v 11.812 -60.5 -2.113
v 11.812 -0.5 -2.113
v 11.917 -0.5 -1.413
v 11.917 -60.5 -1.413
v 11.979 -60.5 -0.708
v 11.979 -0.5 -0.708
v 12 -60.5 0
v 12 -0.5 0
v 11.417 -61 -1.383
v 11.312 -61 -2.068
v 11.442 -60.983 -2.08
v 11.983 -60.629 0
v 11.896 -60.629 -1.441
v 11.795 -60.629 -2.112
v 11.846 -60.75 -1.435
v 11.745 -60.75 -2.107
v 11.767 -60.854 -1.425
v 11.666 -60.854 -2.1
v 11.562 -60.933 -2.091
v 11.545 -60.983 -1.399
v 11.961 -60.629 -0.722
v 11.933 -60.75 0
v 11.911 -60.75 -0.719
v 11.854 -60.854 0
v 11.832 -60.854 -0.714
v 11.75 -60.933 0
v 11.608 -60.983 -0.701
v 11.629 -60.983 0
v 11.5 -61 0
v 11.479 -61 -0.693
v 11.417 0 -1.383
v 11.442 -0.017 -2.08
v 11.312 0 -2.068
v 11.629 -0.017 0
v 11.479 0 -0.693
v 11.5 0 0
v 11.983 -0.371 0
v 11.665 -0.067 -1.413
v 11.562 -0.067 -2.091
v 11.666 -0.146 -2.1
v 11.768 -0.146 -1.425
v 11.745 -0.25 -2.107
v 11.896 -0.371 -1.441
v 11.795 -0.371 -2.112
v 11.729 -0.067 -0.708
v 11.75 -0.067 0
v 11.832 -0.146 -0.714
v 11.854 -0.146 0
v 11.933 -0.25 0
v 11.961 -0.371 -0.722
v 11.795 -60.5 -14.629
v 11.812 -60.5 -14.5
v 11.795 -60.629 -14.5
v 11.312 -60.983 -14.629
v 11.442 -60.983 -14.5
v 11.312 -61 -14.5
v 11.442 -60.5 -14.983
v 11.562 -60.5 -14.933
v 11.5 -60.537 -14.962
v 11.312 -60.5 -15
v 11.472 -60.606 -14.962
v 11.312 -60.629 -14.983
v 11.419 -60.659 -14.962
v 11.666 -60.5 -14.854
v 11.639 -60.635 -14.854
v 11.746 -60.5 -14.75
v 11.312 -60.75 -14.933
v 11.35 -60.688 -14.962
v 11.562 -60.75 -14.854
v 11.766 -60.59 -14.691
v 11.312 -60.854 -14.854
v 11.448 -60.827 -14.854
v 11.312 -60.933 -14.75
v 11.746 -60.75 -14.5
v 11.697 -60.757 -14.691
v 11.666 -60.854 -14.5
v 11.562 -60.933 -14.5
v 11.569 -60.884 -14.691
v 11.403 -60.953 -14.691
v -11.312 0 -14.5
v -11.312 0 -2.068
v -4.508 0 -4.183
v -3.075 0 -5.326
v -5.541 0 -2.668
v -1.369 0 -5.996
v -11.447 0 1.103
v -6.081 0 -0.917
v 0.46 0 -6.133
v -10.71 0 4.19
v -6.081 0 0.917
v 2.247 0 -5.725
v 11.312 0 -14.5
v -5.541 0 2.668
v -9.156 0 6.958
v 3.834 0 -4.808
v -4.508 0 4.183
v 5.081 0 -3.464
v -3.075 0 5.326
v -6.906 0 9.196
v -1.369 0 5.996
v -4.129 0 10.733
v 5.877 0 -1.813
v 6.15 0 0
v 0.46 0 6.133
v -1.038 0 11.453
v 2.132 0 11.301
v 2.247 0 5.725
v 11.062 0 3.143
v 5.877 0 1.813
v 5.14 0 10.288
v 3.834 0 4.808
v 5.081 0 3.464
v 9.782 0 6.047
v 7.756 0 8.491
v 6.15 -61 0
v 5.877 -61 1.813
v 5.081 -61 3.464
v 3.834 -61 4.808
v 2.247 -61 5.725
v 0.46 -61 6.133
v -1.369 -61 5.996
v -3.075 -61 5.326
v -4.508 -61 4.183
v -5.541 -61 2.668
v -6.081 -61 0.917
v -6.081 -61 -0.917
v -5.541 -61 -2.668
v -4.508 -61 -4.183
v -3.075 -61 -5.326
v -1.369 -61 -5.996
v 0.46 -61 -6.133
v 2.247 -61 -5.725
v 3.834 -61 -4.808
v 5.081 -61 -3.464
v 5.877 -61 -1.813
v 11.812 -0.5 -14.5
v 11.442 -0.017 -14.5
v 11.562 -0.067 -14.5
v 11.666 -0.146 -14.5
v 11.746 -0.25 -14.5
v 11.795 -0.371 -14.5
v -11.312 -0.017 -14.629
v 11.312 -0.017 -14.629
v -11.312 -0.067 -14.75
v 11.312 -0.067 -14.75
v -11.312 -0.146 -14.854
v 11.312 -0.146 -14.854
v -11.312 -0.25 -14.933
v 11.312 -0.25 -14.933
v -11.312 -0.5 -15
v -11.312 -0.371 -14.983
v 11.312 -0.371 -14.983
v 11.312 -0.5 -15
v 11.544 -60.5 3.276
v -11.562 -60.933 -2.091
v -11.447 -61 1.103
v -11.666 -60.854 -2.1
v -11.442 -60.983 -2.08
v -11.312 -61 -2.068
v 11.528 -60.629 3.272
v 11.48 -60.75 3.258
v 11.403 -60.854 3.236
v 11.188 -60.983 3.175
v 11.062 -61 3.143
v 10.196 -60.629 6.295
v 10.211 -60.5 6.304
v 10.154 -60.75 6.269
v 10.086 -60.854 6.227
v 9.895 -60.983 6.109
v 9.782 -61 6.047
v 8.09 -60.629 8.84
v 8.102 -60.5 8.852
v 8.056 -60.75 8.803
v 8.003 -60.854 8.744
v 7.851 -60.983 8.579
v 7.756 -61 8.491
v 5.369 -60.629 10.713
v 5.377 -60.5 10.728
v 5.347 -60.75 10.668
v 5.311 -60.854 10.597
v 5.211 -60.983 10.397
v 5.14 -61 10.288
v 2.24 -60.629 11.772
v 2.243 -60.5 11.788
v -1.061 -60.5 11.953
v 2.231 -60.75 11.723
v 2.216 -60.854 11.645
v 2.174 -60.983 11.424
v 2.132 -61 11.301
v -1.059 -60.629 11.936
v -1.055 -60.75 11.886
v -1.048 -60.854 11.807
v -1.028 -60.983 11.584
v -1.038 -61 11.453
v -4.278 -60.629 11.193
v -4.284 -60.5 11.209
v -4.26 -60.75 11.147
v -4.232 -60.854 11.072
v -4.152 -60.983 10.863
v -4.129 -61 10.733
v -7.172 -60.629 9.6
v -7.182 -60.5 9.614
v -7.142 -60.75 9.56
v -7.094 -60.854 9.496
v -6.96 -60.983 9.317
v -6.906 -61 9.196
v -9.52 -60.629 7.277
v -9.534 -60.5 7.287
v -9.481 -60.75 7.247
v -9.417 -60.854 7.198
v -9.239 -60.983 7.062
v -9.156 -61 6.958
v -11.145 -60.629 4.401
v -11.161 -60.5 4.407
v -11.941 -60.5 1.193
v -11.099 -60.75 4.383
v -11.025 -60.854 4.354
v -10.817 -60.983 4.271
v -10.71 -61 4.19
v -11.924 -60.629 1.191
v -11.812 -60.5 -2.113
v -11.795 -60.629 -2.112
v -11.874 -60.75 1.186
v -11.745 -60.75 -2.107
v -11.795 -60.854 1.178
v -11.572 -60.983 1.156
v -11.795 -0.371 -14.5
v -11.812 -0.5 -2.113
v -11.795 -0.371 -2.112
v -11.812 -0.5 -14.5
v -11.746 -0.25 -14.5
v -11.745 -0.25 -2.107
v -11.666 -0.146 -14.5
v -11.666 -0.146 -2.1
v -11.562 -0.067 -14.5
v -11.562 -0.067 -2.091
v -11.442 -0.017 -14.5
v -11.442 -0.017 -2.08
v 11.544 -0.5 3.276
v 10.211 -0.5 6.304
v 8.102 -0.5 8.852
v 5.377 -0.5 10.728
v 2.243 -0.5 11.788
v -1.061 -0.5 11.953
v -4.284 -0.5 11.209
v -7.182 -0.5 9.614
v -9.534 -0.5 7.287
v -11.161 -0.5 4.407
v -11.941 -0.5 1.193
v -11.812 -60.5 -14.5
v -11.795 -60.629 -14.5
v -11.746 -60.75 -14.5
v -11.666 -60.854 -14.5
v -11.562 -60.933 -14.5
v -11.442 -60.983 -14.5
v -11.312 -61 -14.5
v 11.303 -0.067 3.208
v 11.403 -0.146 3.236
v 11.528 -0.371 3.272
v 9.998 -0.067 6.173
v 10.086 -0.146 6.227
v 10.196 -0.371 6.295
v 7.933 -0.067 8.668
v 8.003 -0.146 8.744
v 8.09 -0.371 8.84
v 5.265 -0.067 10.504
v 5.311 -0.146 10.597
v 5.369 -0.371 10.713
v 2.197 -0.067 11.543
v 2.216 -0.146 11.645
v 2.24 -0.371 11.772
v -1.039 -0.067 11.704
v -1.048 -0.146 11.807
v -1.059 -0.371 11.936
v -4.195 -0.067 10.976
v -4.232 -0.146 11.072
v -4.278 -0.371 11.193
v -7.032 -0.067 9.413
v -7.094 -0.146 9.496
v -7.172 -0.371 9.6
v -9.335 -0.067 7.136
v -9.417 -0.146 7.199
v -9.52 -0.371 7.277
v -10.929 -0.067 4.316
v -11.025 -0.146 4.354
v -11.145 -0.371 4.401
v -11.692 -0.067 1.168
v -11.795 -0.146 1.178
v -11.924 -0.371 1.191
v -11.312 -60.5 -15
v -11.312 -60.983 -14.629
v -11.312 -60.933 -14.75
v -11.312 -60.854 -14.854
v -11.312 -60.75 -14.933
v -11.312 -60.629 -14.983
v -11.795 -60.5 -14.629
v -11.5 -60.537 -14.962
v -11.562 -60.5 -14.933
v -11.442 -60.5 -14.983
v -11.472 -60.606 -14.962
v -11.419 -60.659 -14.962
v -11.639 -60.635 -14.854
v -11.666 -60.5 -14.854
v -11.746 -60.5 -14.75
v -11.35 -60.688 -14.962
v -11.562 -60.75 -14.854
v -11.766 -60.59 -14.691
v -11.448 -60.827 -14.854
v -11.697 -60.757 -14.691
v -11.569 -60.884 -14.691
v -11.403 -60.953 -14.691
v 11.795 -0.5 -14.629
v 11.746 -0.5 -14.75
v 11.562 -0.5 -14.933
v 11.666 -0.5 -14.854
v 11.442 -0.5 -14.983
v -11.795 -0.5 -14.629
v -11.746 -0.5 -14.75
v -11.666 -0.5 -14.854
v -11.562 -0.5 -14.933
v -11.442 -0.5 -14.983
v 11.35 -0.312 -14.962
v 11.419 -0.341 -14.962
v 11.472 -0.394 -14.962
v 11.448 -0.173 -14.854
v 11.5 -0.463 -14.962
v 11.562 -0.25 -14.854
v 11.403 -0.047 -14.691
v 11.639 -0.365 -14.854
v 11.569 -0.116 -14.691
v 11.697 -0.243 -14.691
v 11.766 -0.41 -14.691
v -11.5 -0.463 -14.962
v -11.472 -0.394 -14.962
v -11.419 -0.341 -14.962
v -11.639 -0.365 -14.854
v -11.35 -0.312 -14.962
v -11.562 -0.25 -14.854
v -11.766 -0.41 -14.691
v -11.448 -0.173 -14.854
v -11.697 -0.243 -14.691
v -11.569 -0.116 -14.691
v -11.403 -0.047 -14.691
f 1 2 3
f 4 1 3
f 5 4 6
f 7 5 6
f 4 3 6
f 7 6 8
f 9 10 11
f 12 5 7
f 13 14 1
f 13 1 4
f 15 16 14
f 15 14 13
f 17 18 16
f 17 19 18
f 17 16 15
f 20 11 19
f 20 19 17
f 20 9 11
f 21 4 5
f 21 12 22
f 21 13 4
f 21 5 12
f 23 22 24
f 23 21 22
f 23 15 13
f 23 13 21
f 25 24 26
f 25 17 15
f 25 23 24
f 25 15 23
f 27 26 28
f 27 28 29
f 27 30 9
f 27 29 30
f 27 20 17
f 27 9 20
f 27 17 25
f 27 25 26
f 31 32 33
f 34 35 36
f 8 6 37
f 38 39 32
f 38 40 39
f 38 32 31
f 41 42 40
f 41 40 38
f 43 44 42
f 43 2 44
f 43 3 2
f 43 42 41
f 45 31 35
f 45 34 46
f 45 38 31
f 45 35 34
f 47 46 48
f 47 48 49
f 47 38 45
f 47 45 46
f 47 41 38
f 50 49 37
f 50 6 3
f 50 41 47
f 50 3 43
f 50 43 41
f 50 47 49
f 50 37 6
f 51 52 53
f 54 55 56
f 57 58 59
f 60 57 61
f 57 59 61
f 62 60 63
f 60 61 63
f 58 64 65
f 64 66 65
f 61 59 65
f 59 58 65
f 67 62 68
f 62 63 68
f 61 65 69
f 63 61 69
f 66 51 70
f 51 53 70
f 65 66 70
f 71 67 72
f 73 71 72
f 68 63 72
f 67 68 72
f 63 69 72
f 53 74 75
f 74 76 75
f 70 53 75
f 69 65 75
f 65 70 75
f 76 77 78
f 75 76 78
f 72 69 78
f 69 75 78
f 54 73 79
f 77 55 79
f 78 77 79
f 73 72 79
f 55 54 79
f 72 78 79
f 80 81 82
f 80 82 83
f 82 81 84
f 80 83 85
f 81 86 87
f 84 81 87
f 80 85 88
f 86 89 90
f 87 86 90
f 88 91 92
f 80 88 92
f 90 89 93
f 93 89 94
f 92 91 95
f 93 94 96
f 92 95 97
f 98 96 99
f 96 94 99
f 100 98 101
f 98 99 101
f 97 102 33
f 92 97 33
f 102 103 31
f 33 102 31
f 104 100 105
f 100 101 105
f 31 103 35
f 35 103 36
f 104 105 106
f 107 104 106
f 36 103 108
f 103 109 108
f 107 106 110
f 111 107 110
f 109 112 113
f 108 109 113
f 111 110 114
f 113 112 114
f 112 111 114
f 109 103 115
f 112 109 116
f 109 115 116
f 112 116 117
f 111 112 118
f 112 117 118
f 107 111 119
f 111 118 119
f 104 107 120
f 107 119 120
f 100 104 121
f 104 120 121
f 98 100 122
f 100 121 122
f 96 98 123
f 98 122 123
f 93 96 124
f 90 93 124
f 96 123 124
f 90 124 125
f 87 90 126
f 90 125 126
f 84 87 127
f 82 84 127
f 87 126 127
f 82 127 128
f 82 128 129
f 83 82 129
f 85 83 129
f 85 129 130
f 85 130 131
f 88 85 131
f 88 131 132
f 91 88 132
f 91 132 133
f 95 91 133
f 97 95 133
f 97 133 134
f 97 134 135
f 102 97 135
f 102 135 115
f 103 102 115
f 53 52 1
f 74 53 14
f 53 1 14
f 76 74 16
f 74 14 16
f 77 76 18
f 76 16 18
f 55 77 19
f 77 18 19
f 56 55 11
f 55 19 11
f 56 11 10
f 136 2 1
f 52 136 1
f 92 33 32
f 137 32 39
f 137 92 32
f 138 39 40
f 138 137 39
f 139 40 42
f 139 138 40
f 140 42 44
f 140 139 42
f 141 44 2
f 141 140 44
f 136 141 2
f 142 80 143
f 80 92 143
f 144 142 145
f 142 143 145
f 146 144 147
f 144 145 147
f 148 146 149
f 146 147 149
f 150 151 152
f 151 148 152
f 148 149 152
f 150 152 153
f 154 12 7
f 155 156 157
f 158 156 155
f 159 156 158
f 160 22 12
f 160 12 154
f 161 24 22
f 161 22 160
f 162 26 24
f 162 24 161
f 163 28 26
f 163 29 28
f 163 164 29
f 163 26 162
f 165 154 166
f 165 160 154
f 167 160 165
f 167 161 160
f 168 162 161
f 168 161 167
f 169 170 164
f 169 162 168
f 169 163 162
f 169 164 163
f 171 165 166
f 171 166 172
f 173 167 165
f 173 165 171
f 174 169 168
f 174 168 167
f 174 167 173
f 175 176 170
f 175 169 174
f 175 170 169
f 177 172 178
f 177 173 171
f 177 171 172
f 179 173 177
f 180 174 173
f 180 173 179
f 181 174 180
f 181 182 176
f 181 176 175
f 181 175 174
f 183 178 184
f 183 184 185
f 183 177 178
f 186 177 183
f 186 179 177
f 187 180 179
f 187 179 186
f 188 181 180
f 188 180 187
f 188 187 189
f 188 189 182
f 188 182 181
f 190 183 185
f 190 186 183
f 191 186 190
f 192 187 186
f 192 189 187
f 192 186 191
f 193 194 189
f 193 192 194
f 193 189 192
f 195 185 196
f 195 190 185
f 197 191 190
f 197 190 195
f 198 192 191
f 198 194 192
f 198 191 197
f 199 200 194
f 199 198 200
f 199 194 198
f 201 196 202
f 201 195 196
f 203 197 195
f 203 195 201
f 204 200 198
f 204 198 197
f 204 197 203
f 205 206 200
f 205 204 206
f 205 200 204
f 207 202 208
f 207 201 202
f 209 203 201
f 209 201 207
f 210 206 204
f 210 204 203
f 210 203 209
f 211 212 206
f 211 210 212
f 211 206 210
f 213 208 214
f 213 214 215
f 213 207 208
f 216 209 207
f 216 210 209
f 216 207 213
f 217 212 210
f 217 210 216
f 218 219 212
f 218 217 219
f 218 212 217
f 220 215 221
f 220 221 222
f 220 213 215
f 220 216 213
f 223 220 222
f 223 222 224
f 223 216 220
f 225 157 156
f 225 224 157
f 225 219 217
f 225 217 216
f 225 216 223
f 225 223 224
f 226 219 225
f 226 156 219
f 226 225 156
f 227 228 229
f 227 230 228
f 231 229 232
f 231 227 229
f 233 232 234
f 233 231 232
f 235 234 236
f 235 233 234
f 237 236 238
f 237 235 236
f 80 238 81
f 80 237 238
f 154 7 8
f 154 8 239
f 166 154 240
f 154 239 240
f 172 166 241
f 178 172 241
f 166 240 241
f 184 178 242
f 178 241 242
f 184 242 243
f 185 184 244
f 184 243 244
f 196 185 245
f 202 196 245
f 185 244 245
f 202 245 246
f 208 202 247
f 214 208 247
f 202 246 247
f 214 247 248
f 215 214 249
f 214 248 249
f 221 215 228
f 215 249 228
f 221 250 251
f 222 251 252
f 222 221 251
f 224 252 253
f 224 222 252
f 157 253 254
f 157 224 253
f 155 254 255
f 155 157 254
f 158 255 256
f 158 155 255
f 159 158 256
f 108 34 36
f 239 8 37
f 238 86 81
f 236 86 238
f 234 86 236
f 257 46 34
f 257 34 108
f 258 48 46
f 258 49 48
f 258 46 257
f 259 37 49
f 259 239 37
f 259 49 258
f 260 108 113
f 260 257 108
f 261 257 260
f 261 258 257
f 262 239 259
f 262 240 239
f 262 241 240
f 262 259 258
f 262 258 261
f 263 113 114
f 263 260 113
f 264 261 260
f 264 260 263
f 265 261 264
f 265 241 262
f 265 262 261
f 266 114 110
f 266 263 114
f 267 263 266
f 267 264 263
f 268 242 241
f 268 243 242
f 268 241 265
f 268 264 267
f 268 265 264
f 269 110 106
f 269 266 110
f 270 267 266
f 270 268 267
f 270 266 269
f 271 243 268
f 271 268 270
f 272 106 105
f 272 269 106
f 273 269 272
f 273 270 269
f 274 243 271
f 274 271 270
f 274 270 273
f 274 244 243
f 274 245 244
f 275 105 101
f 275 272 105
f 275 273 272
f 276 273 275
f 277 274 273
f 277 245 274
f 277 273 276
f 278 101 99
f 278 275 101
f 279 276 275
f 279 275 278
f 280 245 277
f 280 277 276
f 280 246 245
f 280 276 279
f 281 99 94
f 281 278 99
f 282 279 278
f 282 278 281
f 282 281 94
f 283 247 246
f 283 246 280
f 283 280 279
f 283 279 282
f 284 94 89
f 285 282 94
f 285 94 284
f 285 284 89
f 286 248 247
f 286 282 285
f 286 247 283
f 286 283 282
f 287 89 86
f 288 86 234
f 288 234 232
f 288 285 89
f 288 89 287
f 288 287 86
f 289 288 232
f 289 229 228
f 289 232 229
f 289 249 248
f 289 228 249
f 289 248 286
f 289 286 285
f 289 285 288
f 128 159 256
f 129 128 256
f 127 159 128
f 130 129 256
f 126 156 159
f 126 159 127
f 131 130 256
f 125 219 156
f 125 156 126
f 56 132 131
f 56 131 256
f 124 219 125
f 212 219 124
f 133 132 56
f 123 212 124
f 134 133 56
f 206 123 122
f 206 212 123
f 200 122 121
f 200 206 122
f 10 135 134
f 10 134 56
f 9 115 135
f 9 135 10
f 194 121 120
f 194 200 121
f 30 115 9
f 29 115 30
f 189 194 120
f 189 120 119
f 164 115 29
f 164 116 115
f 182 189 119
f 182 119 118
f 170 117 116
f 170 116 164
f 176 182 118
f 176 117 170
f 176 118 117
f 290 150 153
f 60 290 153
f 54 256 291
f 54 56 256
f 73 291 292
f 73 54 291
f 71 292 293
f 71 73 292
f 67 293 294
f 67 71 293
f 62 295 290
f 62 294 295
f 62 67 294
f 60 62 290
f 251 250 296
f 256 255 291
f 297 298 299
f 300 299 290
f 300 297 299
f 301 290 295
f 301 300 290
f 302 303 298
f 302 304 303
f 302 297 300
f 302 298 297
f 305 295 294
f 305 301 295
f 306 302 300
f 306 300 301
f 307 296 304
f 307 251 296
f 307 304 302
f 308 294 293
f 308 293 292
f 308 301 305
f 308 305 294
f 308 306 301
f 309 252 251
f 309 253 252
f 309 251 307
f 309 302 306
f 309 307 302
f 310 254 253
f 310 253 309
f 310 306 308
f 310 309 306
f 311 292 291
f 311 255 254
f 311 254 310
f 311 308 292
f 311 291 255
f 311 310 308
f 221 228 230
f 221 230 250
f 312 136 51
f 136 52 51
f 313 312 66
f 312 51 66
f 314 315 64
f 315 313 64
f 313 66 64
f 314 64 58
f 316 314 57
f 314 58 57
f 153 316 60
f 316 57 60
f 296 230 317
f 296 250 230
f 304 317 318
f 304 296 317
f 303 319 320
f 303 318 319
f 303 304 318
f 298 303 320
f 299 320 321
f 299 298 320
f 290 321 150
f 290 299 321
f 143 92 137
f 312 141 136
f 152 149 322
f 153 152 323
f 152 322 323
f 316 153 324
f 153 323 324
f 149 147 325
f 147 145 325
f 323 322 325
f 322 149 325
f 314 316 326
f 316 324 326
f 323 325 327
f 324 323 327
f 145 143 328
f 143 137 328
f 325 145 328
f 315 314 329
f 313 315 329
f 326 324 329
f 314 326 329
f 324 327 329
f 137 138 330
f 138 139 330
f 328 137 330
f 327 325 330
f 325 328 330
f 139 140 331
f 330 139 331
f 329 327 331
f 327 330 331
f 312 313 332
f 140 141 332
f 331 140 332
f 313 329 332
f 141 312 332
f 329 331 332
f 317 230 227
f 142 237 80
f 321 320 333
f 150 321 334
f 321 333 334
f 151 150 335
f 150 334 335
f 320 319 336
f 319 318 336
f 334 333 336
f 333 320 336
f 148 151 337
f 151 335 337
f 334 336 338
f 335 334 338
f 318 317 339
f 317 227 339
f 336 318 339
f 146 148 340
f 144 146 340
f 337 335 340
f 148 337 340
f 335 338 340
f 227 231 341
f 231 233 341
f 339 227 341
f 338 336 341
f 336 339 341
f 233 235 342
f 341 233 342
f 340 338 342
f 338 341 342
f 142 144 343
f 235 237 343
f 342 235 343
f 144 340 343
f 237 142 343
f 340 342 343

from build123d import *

# Parameters (mm, degrees)
F1_R     = 6.15
F2_DEPTH = 61
F3_DEPTH = 61.001
F4_DEPTH = 2
F5_R     = 0.5


# Not quite as in the source:
# - two fillets or chamfers of one size are made in one step


with BuildPart() as f2:
    # F1 (on face) → F2 (new body)
    with BuildSketch(Plane.XZ):
        Circle(F1_R)
    extrude(amount=F2_DEPTH)


with BuildPart() as f2b:
    # F0 (on Front) → F2, piece 2 (new body)
    with BuildSketch(Plane.XZ):
        with BuildLine():
            ThreePointArc((11.8124997243, -2.1130192291), (11.9530330187, -1.0606609515), (12, 0))
            ThreePointArc((12, 0), (-1.0606609515, 11.9530330187), (-11.8124997243, -2.1130192291))
            Line((-11.8124997243, -2.1130192291), (-11.8124997243, 1))
            Line((-11.8124997243, 1), (11.8124997243, 1))
            Line((11.8124997243, 1), (11.8124997243, -2.1130192291))
        make_face()
        with BuildLine():
            Line((-11.8124997243, 1), (-11.8124997243, -2.1130192291))
            ThreePointArc((-11.8124997243, -2.1130192291), (0, -12), (11.8124997243, -2.1130192291))
            Line((11.8124997243, -2.1130192291), (11.8124997243, 1))
            Line((11.8124997243, 1), (-11.8124997243, 1))
        make_face()
        with BuildLine():
            ThreePointArc((11.8124997243, -2.1130192291), (0, -12), (-11.8124997243, -2.1130192291))
            Line((-11.8124997243, -2.1130192291), (-11.8124997243, -13))
            Line((-11.8124997243, -13), (11.8124997243, -13))
            Line((11.8124997243, -13), (11.8124997243, -2.1130192291))
        make_face()
    extrude(amount=F2_DEPTH)


with BuildPart() as f3_tool:
    # F3 (cut, through all): a face of the model
    f3_faces = [f2.part.faces().sort_by_distance(p)[0] for p in [
        (0, -61, 0),
    ]]
    extrude(f3_faces, amount=-F3_DEPTH)


with BuildPart() as f2_1:
    add(f2.part)

    # F3: cut by f3_tool
    add(f3_tool.part, mode=Mode.SUBTRACT)


with BuildPart() as f2b_1:
    add(f2b.part)

    # F3: cut by f3_tool
    add(f3_tool.part, mode=Mode.SUBTRACT)

    # F4 (add): a face of the model
    f4_faces = [f2b_1.faces().sort_by_distance(p)[0] for p in [
        (0, -30.5, -13),
    ]]
    extrude(f4_faces, amount=F4_DEPTH)

    # F5
    f5_edges = [f2b_1.edges().sort_by_distance(p)[0] for p in [
        (0, -61, 12),
        (-11.8125, -61, -8.55651),
        (11.8125, -61, -8.55651),
        (11.8125, 0, -8.55651),
        (-11.8125, 0, -8.55651),
        (0, 0, 12),
        (-11.8125, -30.5, -15),
        (0, 0, -15),
        (11.8125, -30.5, -15),
        (0, -61, -15),
    ]]
    fillet(f5_edges, radius=F5_R)


solid = f2b_1.part
